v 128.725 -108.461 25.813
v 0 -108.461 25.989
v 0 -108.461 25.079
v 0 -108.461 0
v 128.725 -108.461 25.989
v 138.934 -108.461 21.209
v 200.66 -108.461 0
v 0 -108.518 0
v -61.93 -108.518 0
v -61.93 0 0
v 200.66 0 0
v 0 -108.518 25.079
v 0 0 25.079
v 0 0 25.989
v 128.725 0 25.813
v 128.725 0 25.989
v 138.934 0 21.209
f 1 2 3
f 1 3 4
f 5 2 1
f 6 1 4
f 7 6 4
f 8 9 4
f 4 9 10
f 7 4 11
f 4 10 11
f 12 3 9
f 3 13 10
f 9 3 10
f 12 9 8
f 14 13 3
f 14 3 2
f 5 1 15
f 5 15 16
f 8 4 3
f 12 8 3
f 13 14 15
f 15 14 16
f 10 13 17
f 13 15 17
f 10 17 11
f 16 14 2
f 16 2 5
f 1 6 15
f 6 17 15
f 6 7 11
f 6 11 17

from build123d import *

# Parameters (mm, degrees)
F0_W      = 128.7249475718
F0_H      = 25.9889103472
F5_DEPTH  = 25.4
F8_DEPTH  = 25.4
F9_DEPTH  = 83.0614138395
F11_DEPTH = 108.5182130337


with BuildPart() as f5:
    # F0 (on Front) → F5 (new body)
    with BuildSketch(Plane.XZ):
        with Locations((64.3624737859, 12.9944551736)):
            Rectangle(F0_W, F0_H)
    extrude(amount=F5_DEPTH)

    # F6 (on Front) + F7 (on face) → F8 (join)
    with BuildSketch(Plane.XZ):
        Polygon((185.9581768513, 0), (128.5665184259, 25.8846282959), (160.3146493435, 0), align=None)
        Polygon((160.3146493435, 0), (128.5665184259, 25.8846282959), (127.9721856117, 0), align=None)
    with BuildSketch(Plane.XZ):
        Polygon((200.6603479385, 0), (138.9337457069, 21.2088298961), (185.9581768513, 0), align=None)
    extrude(amount=F8_DEPTH)

    # F9 (add): a face of the model
    f9_faces = [f5.faces().sort_by_distance(p)[0] for p in [
        (82.97421567, -25.4, 12.0117681363),
    ]]
    extrude(f9_faces, amount=F9_DEPTH)

    # F10 (on Front) → F11 (join)
    with BuildSketch(Plane.XZ):
        Polygon((0, 0), (0, 25.0786654651), (-61.9297772646, 0), align=None)
    extrude(amount=F11_DEPTH)


solid = f5.part
